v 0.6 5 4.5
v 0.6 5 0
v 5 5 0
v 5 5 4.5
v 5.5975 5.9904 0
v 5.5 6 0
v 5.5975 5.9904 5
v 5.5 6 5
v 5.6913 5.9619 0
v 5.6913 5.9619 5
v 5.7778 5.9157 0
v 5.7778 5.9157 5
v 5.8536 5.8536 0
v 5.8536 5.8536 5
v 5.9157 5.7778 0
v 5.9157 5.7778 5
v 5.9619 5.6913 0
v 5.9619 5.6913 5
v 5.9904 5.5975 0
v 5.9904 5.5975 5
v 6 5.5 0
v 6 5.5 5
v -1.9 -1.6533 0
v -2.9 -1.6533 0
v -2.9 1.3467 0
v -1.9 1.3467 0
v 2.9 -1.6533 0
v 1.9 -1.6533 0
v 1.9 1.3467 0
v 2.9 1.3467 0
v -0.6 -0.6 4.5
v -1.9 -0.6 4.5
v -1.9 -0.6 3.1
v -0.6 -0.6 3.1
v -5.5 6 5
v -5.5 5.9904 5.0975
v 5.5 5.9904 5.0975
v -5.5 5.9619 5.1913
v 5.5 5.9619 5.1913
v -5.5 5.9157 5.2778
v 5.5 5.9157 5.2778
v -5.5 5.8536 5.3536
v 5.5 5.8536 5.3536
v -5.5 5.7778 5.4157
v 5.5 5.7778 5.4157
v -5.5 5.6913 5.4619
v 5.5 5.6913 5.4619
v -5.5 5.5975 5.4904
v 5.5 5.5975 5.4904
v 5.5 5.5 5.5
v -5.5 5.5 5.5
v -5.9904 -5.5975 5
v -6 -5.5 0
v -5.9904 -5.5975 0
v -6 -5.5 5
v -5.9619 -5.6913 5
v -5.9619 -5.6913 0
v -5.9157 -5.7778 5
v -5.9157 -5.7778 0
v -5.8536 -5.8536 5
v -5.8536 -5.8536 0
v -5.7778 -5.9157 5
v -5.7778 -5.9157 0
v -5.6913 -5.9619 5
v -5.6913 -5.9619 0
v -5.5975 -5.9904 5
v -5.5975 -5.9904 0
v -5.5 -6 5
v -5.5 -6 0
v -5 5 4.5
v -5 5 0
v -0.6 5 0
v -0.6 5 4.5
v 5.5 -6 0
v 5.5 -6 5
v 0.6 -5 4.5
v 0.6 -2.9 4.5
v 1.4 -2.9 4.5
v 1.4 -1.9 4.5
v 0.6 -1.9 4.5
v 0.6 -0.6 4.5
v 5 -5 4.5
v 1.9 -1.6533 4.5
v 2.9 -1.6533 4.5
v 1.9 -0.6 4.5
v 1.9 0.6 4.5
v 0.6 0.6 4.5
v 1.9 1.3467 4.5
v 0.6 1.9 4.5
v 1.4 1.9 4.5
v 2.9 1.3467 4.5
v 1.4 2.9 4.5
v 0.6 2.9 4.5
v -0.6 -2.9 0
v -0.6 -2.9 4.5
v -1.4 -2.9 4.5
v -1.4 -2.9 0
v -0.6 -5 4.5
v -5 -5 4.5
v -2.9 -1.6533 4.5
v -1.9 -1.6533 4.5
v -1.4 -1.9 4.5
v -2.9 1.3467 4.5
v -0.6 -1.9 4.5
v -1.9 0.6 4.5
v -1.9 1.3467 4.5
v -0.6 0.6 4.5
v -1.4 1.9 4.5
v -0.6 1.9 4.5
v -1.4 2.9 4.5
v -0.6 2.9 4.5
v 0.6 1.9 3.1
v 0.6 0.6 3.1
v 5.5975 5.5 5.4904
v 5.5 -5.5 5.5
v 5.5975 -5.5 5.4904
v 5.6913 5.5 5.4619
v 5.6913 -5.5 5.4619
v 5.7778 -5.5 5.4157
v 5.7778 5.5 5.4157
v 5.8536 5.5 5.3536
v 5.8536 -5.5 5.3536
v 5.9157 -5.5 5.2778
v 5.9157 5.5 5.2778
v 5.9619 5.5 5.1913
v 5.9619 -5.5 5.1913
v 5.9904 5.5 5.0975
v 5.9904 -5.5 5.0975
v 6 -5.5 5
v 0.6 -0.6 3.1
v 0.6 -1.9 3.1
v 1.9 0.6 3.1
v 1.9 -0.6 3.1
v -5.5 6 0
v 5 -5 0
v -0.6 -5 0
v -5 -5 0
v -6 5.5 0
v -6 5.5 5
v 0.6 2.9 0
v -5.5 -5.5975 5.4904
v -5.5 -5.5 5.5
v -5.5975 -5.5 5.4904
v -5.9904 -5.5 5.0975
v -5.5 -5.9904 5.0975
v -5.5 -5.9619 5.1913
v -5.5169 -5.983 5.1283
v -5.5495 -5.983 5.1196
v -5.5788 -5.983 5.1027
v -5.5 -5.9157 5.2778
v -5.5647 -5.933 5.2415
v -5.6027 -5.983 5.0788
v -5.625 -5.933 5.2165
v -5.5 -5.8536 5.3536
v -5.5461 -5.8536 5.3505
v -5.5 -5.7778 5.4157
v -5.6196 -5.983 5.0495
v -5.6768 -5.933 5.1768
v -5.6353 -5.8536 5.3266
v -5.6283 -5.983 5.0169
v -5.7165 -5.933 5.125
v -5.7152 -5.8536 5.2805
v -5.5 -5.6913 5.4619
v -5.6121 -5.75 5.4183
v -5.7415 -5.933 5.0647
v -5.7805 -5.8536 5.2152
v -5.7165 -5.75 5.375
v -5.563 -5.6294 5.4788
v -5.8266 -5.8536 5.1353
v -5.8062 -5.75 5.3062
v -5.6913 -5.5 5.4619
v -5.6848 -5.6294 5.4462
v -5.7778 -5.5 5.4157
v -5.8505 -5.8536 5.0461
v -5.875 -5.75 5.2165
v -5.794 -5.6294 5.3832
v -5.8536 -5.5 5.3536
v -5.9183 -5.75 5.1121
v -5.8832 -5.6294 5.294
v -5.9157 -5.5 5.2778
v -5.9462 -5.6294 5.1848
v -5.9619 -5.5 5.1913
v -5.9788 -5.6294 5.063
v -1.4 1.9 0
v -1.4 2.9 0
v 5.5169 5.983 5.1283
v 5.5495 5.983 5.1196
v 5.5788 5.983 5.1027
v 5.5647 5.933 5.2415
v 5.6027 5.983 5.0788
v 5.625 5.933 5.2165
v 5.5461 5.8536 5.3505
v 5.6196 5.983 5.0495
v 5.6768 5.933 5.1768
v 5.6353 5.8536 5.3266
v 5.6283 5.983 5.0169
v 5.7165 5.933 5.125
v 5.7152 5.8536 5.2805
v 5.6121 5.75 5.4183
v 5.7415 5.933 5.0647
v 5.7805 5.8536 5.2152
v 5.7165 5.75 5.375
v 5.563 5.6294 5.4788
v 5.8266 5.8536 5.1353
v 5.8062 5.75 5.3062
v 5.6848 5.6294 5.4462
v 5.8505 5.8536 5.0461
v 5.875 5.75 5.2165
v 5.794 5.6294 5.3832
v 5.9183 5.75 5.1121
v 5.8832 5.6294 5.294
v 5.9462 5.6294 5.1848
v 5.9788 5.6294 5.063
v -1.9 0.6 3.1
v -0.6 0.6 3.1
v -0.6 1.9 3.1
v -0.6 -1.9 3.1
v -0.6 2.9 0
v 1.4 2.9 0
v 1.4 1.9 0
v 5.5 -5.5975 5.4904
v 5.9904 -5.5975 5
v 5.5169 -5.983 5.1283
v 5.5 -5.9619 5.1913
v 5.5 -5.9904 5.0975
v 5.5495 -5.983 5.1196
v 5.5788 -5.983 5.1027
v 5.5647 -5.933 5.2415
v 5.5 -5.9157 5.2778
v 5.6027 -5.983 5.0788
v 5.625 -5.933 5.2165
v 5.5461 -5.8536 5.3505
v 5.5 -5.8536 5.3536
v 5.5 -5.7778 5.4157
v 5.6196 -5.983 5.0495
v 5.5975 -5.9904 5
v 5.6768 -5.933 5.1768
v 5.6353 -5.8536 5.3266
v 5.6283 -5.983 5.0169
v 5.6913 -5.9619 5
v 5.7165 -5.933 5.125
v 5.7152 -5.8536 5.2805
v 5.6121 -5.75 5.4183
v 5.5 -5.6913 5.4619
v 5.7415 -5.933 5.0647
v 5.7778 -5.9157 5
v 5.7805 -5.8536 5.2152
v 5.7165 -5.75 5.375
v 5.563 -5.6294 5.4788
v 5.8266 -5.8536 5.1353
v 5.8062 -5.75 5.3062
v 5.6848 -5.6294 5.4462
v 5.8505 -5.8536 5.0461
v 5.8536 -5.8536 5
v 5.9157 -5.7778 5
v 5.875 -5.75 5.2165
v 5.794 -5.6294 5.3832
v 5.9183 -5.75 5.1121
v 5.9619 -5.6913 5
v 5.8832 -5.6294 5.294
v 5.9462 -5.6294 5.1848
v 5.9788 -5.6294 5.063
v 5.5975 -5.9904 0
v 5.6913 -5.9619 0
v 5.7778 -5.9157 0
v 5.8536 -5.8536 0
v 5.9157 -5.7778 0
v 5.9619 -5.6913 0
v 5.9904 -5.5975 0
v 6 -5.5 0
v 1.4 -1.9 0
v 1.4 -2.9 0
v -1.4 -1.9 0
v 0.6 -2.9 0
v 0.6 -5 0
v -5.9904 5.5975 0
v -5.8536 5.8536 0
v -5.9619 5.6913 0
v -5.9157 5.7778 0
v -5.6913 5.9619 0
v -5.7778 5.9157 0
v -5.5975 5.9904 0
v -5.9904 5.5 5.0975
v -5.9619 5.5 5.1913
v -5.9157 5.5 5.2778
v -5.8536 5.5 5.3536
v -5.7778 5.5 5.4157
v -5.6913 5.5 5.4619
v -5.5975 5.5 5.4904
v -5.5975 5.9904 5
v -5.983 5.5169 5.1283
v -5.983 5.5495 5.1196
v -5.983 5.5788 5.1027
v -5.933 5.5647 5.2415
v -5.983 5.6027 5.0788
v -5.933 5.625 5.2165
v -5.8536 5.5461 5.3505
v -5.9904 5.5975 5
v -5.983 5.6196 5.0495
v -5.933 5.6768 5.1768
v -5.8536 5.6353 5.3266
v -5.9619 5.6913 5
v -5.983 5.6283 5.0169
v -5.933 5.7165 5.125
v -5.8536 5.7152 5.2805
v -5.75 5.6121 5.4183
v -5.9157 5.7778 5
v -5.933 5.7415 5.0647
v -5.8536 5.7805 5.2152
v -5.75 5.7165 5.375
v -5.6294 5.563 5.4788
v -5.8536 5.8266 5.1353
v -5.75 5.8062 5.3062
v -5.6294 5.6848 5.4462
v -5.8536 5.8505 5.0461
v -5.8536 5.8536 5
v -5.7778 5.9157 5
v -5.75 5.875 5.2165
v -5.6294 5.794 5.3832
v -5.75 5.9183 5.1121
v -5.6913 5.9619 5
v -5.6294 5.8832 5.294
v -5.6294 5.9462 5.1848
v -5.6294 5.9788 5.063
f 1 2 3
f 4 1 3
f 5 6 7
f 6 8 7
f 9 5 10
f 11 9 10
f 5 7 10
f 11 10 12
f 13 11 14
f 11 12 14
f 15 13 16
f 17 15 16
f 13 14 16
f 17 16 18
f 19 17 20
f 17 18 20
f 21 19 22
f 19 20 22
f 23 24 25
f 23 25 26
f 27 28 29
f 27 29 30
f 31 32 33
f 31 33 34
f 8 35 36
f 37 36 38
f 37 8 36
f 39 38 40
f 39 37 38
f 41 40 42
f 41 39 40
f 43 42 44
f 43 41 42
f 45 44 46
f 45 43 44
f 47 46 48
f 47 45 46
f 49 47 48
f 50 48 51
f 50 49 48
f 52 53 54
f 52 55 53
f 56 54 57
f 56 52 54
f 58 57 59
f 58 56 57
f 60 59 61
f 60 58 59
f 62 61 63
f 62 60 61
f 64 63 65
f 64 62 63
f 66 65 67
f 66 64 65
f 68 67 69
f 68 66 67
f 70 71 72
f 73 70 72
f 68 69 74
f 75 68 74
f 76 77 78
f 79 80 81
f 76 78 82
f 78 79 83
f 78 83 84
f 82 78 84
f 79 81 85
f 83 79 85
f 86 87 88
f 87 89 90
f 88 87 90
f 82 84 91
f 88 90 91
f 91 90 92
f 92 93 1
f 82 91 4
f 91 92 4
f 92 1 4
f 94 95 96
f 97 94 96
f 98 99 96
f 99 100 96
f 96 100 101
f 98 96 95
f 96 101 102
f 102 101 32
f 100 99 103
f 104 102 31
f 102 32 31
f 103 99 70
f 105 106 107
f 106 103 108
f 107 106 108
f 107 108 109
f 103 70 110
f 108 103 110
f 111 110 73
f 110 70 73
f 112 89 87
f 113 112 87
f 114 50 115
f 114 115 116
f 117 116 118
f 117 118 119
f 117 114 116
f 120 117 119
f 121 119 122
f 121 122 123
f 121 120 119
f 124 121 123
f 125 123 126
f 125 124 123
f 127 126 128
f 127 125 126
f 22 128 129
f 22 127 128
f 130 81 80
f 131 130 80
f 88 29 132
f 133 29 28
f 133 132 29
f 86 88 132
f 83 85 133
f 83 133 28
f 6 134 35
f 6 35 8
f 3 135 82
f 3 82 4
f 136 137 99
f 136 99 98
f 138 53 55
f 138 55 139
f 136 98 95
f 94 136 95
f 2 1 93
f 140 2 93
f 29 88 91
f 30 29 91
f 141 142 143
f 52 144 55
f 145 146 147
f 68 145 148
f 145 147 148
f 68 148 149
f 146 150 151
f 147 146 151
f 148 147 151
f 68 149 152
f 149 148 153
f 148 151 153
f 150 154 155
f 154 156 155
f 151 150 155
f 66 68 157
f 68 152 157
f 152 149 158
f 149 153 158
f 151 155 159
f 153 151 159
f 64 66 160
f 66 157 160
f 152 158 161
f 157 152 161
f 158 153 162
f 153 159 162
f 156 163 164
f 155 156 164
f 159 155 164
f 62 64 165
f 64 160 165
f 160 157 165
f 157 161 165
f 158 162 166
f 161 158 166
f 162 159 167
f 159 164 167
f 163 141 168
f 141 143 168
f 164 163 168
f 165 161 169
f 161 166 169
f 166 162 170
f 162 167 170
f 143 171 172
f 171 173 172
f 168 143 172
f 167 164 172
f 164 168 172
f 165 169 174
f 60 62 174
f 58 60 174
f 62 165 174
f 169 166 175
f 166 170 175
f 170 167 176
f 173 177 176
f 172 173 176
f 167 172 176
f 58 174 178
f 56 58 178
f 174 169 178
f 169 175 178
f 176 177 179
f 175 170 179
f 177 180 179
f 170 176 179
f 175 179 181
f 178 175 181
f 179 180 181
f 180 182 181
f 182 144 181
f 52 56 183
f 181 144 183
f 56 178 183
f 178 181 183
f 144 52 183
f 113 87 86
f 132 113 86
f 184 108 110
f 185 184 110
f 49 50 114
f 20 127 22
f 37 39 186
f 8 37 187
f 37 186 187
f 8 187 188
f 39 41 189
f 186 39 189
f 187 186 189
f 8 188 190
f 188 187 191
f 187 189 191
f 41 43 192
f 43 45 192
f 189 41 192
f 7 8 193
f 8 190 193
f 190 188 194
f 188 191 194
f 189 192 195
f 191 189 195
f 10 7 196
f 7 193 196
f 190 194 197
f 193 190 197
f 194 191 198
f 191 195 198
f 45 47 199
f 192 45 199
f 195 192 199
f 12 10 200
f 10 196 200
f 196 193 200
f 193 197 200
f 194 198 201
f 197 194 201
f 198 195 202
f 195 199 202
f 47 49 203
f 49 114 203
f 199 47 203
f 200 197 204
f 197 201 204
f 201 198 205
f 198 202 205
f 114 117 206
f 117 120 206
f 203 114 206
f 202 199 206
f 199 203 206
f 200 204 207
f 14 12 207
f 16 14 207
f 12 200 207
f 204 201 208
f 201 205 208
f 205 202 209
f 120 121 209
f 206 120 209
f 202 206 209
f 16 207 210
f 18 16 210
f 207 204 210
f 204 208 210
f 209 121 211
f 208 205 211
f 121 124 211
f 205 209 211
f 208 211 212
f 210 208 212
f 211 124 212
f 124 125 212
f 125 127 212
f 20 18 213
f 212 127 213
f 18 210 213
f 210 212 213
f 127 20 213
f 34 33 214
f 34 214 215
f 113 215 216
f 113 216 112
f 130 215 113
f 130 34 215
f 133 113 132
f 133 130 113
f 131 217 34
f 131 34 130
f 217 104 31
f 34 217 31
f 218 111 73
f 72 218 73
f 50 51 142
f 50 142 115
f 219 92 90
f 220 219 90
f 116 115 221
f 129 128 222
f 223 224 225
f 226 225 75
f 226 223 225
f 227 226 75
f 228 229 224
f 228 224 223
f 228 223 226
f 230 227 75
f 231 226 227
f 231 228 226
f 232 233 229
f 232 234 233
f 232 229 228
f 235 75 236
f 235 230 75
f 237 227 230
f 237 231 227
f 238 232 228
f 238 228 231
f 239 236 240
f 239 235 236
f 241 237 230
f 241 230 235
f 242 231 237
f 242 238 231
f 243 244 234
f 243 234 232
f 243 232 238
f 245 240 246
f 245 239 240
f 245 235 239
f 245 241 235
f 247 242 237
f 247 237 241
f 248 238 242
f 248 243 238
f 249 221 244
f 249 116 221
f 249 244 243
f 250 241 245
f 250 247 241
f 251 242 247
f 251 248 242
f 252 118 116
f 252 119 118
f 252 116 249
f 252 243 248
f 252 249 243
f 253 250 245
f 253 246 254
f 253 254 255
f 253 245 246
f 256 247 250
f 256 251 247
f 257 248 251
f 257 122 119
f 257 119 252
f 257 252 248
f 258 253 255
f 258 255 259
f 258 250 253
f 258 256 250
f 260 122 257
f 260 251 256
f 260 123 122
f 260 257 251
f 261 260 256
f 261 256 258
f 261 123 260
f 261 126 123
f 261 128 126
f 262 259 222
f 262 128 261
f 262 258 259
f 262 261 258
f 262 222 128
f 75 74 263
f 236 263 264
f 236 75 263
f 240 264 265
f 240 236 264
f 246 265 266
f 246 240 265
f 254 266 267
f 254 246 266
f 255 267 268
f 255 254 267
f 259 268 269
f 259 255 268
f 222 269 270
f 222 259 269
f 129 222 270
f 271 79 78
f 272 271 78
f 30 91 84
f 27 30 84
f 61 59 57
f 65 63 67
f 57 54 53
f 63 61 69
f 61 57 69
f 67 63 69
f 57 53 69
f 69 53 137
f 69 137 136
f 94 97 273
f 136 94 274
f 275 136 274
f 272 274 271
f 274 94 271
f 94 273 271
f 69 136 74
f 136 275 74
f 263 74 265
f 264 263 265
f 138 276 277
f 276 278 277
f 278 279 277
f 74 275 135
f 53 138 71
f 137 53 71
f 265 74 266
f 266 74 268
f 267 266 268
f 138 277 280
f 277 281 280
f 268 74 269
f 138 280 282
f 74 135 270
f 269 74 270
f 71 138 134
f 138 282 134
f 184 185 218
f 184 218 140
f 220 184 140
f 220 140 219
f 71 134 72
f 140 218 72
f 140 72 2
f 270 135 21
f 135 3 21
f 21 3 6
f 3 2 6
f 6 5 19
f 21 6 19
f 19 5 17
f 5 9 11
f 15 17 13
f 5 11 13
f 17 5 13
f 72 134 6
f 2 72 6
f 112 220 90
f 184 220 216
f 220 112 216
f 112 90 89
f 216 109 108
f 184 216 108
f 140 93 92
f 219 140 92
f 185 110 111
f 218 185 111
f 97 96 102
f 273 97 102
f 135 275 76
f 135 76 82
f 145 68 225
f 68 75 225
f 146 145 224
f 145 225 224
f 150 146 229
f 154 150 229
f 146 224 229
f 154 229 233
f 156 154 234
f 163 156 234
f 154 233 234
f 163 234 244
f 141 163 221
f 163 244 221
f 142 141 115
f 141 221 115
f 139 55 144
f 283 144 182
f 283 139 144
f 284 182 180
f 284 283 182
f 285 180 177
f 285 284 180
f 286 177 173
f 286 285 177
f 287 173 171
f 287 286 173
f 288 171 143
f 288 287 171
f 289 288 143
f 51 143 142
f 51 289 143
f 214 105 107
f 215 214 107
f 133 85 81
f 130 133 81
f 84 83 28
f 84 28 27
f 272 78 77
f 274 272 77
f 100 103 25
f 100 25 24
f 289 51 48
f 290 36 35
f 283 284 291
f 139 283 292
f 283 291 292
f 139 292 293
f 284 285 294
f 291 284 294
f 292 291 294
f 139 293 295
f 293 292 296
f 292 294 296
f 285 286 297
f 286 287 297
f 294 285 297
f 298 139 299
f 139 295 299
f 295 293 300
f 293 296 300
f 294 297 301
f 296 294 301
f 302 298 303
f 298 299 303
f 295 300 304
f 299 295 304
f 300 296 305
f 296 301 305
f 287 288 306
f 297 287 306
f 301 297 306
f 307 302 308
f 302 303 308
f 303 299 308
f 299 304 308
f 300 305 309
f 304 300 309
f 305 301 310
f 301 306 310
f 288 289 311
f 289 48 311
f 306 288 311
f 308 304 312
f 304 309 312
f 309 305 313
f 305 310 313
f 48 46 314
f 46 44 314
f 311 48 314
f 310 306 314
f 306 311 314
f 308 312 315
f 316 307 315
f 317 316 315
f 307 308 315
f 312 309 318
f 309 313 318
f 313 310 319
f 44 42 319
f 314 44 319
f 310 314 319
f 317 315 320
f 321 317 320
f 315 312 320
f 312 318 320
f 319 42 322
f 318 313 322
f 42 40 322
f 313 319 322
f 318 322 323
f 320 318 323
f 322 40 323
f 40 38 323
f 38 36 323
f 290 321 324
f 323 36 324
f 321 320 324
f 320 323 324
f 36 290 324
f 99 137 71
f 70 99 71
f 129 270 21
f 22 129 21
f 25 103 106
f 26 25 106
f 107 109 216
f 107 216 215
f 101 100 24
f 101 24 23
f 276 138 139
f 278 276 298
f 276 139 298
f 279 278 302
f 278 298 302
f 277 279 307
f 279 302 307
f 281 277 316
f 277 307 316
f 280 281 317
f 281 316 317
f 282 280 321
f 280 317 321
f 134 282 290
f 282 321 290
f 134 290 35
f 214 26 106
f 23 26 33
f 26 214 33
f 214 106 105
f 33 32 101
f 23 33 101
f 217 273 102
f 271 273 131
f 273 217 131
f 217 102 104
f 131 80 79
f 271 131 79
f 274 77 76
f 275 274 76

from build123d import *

# Parameters (mm, degrees)
F0_W     = 12
F0_H     = 12
F1_DEPTH = 5.5
F2_T     = -1
F3_W     = 1
F3_H     = 3
F4_DEPTH = 4.5
F6_W     = 1.3
F6_H     = 1.2
F6_W_2   = 1.2
F6_H_2   = 1.3
F7_DEPTH = 1.4
F8_R     = 0.5


with BuildPart() as f1:
    # F0 (on Top) → F1 (new body)
    with BuildSketch(Plane.XY):
        Rectangle(F0_W, F0_H)
    extrude(amount=F1_DEPTH)

    # F2
    f2_openings = [f1.faces().sort_by_distance(p)[0] for p in [
        (0, 0, 0),
    ]]
    offset(amount=F2_T, openings=f2_openings)

    # F3 (on face) → F4 (join, through all)
    with BuildSketch(Plane(origin=(0, 0, 4.5), x_dir=(1, 0, 0), z_dir=(0, 0, -1))):
        with Locations((2.4, 0.1532564508)):
            Rectangle(F3_W, F3_H)
        Polygon((0.6, 2.9), (0.6, 5), (0, 5), (-0.6, 5), (-0.6, 2.9), (-1.4, 2.9), (-1.4, 1.9), (0, 1.9), (1.4, 1.9), (1.4, 2.9), align=None)
        with Locations((-2.4, 0.1532564508)):
            Rectangle(F3_W, F3_H)
        Polygon((0, -1.9), (-1.4, -1.9), (-1.4, -2.9), (-0.6, -2.9), (-0.6, -5), (0, -5), (0.6, -5), (0.6, -2.9), (1.4, -2.9), (1.4, -1.9), align=None)
    extrude(amount=F4_DEPTH)

    # F6 (on face) → F7 (join, through all)
    with BuildSketch(Plane(origin=(0, 0, 4.5), x_dir=(1, 0, 0), z_dir=(0, 0, -1))):
        with Locations((1.25, 0)):
            Rectangle(F6_W, F6_H)
        Rectangle(F6_W_2, F6_H)
        with Locations((0, 1.25)):
            Rectangle(F6_W_2, F6_H_2)
        with Locations((-1.25, 0)):
            Rectangle(F6_W, F6_H)
        with Locations((0, -1.25)):
            Rectangle(F6_W_2, F6_H_2)
    extrude(amount=F7_DEPTH)

    # F8
    f8_edges = [f1.edges().sort_by_distance(p)[0] for p in [
        (6, 0, 5.5),
        (0, 6, 5.5),
        (-6, 0, 5.5),
        (0, -6, 5.5),
        (-6, 6, 2.75),
        (-6, -6, 2.75),
        (6, -6, 2.75),
        (6, 6, 2.75),
    ]]
    fillet(f8_edges, radius=F8_R)


solid = f1.part
